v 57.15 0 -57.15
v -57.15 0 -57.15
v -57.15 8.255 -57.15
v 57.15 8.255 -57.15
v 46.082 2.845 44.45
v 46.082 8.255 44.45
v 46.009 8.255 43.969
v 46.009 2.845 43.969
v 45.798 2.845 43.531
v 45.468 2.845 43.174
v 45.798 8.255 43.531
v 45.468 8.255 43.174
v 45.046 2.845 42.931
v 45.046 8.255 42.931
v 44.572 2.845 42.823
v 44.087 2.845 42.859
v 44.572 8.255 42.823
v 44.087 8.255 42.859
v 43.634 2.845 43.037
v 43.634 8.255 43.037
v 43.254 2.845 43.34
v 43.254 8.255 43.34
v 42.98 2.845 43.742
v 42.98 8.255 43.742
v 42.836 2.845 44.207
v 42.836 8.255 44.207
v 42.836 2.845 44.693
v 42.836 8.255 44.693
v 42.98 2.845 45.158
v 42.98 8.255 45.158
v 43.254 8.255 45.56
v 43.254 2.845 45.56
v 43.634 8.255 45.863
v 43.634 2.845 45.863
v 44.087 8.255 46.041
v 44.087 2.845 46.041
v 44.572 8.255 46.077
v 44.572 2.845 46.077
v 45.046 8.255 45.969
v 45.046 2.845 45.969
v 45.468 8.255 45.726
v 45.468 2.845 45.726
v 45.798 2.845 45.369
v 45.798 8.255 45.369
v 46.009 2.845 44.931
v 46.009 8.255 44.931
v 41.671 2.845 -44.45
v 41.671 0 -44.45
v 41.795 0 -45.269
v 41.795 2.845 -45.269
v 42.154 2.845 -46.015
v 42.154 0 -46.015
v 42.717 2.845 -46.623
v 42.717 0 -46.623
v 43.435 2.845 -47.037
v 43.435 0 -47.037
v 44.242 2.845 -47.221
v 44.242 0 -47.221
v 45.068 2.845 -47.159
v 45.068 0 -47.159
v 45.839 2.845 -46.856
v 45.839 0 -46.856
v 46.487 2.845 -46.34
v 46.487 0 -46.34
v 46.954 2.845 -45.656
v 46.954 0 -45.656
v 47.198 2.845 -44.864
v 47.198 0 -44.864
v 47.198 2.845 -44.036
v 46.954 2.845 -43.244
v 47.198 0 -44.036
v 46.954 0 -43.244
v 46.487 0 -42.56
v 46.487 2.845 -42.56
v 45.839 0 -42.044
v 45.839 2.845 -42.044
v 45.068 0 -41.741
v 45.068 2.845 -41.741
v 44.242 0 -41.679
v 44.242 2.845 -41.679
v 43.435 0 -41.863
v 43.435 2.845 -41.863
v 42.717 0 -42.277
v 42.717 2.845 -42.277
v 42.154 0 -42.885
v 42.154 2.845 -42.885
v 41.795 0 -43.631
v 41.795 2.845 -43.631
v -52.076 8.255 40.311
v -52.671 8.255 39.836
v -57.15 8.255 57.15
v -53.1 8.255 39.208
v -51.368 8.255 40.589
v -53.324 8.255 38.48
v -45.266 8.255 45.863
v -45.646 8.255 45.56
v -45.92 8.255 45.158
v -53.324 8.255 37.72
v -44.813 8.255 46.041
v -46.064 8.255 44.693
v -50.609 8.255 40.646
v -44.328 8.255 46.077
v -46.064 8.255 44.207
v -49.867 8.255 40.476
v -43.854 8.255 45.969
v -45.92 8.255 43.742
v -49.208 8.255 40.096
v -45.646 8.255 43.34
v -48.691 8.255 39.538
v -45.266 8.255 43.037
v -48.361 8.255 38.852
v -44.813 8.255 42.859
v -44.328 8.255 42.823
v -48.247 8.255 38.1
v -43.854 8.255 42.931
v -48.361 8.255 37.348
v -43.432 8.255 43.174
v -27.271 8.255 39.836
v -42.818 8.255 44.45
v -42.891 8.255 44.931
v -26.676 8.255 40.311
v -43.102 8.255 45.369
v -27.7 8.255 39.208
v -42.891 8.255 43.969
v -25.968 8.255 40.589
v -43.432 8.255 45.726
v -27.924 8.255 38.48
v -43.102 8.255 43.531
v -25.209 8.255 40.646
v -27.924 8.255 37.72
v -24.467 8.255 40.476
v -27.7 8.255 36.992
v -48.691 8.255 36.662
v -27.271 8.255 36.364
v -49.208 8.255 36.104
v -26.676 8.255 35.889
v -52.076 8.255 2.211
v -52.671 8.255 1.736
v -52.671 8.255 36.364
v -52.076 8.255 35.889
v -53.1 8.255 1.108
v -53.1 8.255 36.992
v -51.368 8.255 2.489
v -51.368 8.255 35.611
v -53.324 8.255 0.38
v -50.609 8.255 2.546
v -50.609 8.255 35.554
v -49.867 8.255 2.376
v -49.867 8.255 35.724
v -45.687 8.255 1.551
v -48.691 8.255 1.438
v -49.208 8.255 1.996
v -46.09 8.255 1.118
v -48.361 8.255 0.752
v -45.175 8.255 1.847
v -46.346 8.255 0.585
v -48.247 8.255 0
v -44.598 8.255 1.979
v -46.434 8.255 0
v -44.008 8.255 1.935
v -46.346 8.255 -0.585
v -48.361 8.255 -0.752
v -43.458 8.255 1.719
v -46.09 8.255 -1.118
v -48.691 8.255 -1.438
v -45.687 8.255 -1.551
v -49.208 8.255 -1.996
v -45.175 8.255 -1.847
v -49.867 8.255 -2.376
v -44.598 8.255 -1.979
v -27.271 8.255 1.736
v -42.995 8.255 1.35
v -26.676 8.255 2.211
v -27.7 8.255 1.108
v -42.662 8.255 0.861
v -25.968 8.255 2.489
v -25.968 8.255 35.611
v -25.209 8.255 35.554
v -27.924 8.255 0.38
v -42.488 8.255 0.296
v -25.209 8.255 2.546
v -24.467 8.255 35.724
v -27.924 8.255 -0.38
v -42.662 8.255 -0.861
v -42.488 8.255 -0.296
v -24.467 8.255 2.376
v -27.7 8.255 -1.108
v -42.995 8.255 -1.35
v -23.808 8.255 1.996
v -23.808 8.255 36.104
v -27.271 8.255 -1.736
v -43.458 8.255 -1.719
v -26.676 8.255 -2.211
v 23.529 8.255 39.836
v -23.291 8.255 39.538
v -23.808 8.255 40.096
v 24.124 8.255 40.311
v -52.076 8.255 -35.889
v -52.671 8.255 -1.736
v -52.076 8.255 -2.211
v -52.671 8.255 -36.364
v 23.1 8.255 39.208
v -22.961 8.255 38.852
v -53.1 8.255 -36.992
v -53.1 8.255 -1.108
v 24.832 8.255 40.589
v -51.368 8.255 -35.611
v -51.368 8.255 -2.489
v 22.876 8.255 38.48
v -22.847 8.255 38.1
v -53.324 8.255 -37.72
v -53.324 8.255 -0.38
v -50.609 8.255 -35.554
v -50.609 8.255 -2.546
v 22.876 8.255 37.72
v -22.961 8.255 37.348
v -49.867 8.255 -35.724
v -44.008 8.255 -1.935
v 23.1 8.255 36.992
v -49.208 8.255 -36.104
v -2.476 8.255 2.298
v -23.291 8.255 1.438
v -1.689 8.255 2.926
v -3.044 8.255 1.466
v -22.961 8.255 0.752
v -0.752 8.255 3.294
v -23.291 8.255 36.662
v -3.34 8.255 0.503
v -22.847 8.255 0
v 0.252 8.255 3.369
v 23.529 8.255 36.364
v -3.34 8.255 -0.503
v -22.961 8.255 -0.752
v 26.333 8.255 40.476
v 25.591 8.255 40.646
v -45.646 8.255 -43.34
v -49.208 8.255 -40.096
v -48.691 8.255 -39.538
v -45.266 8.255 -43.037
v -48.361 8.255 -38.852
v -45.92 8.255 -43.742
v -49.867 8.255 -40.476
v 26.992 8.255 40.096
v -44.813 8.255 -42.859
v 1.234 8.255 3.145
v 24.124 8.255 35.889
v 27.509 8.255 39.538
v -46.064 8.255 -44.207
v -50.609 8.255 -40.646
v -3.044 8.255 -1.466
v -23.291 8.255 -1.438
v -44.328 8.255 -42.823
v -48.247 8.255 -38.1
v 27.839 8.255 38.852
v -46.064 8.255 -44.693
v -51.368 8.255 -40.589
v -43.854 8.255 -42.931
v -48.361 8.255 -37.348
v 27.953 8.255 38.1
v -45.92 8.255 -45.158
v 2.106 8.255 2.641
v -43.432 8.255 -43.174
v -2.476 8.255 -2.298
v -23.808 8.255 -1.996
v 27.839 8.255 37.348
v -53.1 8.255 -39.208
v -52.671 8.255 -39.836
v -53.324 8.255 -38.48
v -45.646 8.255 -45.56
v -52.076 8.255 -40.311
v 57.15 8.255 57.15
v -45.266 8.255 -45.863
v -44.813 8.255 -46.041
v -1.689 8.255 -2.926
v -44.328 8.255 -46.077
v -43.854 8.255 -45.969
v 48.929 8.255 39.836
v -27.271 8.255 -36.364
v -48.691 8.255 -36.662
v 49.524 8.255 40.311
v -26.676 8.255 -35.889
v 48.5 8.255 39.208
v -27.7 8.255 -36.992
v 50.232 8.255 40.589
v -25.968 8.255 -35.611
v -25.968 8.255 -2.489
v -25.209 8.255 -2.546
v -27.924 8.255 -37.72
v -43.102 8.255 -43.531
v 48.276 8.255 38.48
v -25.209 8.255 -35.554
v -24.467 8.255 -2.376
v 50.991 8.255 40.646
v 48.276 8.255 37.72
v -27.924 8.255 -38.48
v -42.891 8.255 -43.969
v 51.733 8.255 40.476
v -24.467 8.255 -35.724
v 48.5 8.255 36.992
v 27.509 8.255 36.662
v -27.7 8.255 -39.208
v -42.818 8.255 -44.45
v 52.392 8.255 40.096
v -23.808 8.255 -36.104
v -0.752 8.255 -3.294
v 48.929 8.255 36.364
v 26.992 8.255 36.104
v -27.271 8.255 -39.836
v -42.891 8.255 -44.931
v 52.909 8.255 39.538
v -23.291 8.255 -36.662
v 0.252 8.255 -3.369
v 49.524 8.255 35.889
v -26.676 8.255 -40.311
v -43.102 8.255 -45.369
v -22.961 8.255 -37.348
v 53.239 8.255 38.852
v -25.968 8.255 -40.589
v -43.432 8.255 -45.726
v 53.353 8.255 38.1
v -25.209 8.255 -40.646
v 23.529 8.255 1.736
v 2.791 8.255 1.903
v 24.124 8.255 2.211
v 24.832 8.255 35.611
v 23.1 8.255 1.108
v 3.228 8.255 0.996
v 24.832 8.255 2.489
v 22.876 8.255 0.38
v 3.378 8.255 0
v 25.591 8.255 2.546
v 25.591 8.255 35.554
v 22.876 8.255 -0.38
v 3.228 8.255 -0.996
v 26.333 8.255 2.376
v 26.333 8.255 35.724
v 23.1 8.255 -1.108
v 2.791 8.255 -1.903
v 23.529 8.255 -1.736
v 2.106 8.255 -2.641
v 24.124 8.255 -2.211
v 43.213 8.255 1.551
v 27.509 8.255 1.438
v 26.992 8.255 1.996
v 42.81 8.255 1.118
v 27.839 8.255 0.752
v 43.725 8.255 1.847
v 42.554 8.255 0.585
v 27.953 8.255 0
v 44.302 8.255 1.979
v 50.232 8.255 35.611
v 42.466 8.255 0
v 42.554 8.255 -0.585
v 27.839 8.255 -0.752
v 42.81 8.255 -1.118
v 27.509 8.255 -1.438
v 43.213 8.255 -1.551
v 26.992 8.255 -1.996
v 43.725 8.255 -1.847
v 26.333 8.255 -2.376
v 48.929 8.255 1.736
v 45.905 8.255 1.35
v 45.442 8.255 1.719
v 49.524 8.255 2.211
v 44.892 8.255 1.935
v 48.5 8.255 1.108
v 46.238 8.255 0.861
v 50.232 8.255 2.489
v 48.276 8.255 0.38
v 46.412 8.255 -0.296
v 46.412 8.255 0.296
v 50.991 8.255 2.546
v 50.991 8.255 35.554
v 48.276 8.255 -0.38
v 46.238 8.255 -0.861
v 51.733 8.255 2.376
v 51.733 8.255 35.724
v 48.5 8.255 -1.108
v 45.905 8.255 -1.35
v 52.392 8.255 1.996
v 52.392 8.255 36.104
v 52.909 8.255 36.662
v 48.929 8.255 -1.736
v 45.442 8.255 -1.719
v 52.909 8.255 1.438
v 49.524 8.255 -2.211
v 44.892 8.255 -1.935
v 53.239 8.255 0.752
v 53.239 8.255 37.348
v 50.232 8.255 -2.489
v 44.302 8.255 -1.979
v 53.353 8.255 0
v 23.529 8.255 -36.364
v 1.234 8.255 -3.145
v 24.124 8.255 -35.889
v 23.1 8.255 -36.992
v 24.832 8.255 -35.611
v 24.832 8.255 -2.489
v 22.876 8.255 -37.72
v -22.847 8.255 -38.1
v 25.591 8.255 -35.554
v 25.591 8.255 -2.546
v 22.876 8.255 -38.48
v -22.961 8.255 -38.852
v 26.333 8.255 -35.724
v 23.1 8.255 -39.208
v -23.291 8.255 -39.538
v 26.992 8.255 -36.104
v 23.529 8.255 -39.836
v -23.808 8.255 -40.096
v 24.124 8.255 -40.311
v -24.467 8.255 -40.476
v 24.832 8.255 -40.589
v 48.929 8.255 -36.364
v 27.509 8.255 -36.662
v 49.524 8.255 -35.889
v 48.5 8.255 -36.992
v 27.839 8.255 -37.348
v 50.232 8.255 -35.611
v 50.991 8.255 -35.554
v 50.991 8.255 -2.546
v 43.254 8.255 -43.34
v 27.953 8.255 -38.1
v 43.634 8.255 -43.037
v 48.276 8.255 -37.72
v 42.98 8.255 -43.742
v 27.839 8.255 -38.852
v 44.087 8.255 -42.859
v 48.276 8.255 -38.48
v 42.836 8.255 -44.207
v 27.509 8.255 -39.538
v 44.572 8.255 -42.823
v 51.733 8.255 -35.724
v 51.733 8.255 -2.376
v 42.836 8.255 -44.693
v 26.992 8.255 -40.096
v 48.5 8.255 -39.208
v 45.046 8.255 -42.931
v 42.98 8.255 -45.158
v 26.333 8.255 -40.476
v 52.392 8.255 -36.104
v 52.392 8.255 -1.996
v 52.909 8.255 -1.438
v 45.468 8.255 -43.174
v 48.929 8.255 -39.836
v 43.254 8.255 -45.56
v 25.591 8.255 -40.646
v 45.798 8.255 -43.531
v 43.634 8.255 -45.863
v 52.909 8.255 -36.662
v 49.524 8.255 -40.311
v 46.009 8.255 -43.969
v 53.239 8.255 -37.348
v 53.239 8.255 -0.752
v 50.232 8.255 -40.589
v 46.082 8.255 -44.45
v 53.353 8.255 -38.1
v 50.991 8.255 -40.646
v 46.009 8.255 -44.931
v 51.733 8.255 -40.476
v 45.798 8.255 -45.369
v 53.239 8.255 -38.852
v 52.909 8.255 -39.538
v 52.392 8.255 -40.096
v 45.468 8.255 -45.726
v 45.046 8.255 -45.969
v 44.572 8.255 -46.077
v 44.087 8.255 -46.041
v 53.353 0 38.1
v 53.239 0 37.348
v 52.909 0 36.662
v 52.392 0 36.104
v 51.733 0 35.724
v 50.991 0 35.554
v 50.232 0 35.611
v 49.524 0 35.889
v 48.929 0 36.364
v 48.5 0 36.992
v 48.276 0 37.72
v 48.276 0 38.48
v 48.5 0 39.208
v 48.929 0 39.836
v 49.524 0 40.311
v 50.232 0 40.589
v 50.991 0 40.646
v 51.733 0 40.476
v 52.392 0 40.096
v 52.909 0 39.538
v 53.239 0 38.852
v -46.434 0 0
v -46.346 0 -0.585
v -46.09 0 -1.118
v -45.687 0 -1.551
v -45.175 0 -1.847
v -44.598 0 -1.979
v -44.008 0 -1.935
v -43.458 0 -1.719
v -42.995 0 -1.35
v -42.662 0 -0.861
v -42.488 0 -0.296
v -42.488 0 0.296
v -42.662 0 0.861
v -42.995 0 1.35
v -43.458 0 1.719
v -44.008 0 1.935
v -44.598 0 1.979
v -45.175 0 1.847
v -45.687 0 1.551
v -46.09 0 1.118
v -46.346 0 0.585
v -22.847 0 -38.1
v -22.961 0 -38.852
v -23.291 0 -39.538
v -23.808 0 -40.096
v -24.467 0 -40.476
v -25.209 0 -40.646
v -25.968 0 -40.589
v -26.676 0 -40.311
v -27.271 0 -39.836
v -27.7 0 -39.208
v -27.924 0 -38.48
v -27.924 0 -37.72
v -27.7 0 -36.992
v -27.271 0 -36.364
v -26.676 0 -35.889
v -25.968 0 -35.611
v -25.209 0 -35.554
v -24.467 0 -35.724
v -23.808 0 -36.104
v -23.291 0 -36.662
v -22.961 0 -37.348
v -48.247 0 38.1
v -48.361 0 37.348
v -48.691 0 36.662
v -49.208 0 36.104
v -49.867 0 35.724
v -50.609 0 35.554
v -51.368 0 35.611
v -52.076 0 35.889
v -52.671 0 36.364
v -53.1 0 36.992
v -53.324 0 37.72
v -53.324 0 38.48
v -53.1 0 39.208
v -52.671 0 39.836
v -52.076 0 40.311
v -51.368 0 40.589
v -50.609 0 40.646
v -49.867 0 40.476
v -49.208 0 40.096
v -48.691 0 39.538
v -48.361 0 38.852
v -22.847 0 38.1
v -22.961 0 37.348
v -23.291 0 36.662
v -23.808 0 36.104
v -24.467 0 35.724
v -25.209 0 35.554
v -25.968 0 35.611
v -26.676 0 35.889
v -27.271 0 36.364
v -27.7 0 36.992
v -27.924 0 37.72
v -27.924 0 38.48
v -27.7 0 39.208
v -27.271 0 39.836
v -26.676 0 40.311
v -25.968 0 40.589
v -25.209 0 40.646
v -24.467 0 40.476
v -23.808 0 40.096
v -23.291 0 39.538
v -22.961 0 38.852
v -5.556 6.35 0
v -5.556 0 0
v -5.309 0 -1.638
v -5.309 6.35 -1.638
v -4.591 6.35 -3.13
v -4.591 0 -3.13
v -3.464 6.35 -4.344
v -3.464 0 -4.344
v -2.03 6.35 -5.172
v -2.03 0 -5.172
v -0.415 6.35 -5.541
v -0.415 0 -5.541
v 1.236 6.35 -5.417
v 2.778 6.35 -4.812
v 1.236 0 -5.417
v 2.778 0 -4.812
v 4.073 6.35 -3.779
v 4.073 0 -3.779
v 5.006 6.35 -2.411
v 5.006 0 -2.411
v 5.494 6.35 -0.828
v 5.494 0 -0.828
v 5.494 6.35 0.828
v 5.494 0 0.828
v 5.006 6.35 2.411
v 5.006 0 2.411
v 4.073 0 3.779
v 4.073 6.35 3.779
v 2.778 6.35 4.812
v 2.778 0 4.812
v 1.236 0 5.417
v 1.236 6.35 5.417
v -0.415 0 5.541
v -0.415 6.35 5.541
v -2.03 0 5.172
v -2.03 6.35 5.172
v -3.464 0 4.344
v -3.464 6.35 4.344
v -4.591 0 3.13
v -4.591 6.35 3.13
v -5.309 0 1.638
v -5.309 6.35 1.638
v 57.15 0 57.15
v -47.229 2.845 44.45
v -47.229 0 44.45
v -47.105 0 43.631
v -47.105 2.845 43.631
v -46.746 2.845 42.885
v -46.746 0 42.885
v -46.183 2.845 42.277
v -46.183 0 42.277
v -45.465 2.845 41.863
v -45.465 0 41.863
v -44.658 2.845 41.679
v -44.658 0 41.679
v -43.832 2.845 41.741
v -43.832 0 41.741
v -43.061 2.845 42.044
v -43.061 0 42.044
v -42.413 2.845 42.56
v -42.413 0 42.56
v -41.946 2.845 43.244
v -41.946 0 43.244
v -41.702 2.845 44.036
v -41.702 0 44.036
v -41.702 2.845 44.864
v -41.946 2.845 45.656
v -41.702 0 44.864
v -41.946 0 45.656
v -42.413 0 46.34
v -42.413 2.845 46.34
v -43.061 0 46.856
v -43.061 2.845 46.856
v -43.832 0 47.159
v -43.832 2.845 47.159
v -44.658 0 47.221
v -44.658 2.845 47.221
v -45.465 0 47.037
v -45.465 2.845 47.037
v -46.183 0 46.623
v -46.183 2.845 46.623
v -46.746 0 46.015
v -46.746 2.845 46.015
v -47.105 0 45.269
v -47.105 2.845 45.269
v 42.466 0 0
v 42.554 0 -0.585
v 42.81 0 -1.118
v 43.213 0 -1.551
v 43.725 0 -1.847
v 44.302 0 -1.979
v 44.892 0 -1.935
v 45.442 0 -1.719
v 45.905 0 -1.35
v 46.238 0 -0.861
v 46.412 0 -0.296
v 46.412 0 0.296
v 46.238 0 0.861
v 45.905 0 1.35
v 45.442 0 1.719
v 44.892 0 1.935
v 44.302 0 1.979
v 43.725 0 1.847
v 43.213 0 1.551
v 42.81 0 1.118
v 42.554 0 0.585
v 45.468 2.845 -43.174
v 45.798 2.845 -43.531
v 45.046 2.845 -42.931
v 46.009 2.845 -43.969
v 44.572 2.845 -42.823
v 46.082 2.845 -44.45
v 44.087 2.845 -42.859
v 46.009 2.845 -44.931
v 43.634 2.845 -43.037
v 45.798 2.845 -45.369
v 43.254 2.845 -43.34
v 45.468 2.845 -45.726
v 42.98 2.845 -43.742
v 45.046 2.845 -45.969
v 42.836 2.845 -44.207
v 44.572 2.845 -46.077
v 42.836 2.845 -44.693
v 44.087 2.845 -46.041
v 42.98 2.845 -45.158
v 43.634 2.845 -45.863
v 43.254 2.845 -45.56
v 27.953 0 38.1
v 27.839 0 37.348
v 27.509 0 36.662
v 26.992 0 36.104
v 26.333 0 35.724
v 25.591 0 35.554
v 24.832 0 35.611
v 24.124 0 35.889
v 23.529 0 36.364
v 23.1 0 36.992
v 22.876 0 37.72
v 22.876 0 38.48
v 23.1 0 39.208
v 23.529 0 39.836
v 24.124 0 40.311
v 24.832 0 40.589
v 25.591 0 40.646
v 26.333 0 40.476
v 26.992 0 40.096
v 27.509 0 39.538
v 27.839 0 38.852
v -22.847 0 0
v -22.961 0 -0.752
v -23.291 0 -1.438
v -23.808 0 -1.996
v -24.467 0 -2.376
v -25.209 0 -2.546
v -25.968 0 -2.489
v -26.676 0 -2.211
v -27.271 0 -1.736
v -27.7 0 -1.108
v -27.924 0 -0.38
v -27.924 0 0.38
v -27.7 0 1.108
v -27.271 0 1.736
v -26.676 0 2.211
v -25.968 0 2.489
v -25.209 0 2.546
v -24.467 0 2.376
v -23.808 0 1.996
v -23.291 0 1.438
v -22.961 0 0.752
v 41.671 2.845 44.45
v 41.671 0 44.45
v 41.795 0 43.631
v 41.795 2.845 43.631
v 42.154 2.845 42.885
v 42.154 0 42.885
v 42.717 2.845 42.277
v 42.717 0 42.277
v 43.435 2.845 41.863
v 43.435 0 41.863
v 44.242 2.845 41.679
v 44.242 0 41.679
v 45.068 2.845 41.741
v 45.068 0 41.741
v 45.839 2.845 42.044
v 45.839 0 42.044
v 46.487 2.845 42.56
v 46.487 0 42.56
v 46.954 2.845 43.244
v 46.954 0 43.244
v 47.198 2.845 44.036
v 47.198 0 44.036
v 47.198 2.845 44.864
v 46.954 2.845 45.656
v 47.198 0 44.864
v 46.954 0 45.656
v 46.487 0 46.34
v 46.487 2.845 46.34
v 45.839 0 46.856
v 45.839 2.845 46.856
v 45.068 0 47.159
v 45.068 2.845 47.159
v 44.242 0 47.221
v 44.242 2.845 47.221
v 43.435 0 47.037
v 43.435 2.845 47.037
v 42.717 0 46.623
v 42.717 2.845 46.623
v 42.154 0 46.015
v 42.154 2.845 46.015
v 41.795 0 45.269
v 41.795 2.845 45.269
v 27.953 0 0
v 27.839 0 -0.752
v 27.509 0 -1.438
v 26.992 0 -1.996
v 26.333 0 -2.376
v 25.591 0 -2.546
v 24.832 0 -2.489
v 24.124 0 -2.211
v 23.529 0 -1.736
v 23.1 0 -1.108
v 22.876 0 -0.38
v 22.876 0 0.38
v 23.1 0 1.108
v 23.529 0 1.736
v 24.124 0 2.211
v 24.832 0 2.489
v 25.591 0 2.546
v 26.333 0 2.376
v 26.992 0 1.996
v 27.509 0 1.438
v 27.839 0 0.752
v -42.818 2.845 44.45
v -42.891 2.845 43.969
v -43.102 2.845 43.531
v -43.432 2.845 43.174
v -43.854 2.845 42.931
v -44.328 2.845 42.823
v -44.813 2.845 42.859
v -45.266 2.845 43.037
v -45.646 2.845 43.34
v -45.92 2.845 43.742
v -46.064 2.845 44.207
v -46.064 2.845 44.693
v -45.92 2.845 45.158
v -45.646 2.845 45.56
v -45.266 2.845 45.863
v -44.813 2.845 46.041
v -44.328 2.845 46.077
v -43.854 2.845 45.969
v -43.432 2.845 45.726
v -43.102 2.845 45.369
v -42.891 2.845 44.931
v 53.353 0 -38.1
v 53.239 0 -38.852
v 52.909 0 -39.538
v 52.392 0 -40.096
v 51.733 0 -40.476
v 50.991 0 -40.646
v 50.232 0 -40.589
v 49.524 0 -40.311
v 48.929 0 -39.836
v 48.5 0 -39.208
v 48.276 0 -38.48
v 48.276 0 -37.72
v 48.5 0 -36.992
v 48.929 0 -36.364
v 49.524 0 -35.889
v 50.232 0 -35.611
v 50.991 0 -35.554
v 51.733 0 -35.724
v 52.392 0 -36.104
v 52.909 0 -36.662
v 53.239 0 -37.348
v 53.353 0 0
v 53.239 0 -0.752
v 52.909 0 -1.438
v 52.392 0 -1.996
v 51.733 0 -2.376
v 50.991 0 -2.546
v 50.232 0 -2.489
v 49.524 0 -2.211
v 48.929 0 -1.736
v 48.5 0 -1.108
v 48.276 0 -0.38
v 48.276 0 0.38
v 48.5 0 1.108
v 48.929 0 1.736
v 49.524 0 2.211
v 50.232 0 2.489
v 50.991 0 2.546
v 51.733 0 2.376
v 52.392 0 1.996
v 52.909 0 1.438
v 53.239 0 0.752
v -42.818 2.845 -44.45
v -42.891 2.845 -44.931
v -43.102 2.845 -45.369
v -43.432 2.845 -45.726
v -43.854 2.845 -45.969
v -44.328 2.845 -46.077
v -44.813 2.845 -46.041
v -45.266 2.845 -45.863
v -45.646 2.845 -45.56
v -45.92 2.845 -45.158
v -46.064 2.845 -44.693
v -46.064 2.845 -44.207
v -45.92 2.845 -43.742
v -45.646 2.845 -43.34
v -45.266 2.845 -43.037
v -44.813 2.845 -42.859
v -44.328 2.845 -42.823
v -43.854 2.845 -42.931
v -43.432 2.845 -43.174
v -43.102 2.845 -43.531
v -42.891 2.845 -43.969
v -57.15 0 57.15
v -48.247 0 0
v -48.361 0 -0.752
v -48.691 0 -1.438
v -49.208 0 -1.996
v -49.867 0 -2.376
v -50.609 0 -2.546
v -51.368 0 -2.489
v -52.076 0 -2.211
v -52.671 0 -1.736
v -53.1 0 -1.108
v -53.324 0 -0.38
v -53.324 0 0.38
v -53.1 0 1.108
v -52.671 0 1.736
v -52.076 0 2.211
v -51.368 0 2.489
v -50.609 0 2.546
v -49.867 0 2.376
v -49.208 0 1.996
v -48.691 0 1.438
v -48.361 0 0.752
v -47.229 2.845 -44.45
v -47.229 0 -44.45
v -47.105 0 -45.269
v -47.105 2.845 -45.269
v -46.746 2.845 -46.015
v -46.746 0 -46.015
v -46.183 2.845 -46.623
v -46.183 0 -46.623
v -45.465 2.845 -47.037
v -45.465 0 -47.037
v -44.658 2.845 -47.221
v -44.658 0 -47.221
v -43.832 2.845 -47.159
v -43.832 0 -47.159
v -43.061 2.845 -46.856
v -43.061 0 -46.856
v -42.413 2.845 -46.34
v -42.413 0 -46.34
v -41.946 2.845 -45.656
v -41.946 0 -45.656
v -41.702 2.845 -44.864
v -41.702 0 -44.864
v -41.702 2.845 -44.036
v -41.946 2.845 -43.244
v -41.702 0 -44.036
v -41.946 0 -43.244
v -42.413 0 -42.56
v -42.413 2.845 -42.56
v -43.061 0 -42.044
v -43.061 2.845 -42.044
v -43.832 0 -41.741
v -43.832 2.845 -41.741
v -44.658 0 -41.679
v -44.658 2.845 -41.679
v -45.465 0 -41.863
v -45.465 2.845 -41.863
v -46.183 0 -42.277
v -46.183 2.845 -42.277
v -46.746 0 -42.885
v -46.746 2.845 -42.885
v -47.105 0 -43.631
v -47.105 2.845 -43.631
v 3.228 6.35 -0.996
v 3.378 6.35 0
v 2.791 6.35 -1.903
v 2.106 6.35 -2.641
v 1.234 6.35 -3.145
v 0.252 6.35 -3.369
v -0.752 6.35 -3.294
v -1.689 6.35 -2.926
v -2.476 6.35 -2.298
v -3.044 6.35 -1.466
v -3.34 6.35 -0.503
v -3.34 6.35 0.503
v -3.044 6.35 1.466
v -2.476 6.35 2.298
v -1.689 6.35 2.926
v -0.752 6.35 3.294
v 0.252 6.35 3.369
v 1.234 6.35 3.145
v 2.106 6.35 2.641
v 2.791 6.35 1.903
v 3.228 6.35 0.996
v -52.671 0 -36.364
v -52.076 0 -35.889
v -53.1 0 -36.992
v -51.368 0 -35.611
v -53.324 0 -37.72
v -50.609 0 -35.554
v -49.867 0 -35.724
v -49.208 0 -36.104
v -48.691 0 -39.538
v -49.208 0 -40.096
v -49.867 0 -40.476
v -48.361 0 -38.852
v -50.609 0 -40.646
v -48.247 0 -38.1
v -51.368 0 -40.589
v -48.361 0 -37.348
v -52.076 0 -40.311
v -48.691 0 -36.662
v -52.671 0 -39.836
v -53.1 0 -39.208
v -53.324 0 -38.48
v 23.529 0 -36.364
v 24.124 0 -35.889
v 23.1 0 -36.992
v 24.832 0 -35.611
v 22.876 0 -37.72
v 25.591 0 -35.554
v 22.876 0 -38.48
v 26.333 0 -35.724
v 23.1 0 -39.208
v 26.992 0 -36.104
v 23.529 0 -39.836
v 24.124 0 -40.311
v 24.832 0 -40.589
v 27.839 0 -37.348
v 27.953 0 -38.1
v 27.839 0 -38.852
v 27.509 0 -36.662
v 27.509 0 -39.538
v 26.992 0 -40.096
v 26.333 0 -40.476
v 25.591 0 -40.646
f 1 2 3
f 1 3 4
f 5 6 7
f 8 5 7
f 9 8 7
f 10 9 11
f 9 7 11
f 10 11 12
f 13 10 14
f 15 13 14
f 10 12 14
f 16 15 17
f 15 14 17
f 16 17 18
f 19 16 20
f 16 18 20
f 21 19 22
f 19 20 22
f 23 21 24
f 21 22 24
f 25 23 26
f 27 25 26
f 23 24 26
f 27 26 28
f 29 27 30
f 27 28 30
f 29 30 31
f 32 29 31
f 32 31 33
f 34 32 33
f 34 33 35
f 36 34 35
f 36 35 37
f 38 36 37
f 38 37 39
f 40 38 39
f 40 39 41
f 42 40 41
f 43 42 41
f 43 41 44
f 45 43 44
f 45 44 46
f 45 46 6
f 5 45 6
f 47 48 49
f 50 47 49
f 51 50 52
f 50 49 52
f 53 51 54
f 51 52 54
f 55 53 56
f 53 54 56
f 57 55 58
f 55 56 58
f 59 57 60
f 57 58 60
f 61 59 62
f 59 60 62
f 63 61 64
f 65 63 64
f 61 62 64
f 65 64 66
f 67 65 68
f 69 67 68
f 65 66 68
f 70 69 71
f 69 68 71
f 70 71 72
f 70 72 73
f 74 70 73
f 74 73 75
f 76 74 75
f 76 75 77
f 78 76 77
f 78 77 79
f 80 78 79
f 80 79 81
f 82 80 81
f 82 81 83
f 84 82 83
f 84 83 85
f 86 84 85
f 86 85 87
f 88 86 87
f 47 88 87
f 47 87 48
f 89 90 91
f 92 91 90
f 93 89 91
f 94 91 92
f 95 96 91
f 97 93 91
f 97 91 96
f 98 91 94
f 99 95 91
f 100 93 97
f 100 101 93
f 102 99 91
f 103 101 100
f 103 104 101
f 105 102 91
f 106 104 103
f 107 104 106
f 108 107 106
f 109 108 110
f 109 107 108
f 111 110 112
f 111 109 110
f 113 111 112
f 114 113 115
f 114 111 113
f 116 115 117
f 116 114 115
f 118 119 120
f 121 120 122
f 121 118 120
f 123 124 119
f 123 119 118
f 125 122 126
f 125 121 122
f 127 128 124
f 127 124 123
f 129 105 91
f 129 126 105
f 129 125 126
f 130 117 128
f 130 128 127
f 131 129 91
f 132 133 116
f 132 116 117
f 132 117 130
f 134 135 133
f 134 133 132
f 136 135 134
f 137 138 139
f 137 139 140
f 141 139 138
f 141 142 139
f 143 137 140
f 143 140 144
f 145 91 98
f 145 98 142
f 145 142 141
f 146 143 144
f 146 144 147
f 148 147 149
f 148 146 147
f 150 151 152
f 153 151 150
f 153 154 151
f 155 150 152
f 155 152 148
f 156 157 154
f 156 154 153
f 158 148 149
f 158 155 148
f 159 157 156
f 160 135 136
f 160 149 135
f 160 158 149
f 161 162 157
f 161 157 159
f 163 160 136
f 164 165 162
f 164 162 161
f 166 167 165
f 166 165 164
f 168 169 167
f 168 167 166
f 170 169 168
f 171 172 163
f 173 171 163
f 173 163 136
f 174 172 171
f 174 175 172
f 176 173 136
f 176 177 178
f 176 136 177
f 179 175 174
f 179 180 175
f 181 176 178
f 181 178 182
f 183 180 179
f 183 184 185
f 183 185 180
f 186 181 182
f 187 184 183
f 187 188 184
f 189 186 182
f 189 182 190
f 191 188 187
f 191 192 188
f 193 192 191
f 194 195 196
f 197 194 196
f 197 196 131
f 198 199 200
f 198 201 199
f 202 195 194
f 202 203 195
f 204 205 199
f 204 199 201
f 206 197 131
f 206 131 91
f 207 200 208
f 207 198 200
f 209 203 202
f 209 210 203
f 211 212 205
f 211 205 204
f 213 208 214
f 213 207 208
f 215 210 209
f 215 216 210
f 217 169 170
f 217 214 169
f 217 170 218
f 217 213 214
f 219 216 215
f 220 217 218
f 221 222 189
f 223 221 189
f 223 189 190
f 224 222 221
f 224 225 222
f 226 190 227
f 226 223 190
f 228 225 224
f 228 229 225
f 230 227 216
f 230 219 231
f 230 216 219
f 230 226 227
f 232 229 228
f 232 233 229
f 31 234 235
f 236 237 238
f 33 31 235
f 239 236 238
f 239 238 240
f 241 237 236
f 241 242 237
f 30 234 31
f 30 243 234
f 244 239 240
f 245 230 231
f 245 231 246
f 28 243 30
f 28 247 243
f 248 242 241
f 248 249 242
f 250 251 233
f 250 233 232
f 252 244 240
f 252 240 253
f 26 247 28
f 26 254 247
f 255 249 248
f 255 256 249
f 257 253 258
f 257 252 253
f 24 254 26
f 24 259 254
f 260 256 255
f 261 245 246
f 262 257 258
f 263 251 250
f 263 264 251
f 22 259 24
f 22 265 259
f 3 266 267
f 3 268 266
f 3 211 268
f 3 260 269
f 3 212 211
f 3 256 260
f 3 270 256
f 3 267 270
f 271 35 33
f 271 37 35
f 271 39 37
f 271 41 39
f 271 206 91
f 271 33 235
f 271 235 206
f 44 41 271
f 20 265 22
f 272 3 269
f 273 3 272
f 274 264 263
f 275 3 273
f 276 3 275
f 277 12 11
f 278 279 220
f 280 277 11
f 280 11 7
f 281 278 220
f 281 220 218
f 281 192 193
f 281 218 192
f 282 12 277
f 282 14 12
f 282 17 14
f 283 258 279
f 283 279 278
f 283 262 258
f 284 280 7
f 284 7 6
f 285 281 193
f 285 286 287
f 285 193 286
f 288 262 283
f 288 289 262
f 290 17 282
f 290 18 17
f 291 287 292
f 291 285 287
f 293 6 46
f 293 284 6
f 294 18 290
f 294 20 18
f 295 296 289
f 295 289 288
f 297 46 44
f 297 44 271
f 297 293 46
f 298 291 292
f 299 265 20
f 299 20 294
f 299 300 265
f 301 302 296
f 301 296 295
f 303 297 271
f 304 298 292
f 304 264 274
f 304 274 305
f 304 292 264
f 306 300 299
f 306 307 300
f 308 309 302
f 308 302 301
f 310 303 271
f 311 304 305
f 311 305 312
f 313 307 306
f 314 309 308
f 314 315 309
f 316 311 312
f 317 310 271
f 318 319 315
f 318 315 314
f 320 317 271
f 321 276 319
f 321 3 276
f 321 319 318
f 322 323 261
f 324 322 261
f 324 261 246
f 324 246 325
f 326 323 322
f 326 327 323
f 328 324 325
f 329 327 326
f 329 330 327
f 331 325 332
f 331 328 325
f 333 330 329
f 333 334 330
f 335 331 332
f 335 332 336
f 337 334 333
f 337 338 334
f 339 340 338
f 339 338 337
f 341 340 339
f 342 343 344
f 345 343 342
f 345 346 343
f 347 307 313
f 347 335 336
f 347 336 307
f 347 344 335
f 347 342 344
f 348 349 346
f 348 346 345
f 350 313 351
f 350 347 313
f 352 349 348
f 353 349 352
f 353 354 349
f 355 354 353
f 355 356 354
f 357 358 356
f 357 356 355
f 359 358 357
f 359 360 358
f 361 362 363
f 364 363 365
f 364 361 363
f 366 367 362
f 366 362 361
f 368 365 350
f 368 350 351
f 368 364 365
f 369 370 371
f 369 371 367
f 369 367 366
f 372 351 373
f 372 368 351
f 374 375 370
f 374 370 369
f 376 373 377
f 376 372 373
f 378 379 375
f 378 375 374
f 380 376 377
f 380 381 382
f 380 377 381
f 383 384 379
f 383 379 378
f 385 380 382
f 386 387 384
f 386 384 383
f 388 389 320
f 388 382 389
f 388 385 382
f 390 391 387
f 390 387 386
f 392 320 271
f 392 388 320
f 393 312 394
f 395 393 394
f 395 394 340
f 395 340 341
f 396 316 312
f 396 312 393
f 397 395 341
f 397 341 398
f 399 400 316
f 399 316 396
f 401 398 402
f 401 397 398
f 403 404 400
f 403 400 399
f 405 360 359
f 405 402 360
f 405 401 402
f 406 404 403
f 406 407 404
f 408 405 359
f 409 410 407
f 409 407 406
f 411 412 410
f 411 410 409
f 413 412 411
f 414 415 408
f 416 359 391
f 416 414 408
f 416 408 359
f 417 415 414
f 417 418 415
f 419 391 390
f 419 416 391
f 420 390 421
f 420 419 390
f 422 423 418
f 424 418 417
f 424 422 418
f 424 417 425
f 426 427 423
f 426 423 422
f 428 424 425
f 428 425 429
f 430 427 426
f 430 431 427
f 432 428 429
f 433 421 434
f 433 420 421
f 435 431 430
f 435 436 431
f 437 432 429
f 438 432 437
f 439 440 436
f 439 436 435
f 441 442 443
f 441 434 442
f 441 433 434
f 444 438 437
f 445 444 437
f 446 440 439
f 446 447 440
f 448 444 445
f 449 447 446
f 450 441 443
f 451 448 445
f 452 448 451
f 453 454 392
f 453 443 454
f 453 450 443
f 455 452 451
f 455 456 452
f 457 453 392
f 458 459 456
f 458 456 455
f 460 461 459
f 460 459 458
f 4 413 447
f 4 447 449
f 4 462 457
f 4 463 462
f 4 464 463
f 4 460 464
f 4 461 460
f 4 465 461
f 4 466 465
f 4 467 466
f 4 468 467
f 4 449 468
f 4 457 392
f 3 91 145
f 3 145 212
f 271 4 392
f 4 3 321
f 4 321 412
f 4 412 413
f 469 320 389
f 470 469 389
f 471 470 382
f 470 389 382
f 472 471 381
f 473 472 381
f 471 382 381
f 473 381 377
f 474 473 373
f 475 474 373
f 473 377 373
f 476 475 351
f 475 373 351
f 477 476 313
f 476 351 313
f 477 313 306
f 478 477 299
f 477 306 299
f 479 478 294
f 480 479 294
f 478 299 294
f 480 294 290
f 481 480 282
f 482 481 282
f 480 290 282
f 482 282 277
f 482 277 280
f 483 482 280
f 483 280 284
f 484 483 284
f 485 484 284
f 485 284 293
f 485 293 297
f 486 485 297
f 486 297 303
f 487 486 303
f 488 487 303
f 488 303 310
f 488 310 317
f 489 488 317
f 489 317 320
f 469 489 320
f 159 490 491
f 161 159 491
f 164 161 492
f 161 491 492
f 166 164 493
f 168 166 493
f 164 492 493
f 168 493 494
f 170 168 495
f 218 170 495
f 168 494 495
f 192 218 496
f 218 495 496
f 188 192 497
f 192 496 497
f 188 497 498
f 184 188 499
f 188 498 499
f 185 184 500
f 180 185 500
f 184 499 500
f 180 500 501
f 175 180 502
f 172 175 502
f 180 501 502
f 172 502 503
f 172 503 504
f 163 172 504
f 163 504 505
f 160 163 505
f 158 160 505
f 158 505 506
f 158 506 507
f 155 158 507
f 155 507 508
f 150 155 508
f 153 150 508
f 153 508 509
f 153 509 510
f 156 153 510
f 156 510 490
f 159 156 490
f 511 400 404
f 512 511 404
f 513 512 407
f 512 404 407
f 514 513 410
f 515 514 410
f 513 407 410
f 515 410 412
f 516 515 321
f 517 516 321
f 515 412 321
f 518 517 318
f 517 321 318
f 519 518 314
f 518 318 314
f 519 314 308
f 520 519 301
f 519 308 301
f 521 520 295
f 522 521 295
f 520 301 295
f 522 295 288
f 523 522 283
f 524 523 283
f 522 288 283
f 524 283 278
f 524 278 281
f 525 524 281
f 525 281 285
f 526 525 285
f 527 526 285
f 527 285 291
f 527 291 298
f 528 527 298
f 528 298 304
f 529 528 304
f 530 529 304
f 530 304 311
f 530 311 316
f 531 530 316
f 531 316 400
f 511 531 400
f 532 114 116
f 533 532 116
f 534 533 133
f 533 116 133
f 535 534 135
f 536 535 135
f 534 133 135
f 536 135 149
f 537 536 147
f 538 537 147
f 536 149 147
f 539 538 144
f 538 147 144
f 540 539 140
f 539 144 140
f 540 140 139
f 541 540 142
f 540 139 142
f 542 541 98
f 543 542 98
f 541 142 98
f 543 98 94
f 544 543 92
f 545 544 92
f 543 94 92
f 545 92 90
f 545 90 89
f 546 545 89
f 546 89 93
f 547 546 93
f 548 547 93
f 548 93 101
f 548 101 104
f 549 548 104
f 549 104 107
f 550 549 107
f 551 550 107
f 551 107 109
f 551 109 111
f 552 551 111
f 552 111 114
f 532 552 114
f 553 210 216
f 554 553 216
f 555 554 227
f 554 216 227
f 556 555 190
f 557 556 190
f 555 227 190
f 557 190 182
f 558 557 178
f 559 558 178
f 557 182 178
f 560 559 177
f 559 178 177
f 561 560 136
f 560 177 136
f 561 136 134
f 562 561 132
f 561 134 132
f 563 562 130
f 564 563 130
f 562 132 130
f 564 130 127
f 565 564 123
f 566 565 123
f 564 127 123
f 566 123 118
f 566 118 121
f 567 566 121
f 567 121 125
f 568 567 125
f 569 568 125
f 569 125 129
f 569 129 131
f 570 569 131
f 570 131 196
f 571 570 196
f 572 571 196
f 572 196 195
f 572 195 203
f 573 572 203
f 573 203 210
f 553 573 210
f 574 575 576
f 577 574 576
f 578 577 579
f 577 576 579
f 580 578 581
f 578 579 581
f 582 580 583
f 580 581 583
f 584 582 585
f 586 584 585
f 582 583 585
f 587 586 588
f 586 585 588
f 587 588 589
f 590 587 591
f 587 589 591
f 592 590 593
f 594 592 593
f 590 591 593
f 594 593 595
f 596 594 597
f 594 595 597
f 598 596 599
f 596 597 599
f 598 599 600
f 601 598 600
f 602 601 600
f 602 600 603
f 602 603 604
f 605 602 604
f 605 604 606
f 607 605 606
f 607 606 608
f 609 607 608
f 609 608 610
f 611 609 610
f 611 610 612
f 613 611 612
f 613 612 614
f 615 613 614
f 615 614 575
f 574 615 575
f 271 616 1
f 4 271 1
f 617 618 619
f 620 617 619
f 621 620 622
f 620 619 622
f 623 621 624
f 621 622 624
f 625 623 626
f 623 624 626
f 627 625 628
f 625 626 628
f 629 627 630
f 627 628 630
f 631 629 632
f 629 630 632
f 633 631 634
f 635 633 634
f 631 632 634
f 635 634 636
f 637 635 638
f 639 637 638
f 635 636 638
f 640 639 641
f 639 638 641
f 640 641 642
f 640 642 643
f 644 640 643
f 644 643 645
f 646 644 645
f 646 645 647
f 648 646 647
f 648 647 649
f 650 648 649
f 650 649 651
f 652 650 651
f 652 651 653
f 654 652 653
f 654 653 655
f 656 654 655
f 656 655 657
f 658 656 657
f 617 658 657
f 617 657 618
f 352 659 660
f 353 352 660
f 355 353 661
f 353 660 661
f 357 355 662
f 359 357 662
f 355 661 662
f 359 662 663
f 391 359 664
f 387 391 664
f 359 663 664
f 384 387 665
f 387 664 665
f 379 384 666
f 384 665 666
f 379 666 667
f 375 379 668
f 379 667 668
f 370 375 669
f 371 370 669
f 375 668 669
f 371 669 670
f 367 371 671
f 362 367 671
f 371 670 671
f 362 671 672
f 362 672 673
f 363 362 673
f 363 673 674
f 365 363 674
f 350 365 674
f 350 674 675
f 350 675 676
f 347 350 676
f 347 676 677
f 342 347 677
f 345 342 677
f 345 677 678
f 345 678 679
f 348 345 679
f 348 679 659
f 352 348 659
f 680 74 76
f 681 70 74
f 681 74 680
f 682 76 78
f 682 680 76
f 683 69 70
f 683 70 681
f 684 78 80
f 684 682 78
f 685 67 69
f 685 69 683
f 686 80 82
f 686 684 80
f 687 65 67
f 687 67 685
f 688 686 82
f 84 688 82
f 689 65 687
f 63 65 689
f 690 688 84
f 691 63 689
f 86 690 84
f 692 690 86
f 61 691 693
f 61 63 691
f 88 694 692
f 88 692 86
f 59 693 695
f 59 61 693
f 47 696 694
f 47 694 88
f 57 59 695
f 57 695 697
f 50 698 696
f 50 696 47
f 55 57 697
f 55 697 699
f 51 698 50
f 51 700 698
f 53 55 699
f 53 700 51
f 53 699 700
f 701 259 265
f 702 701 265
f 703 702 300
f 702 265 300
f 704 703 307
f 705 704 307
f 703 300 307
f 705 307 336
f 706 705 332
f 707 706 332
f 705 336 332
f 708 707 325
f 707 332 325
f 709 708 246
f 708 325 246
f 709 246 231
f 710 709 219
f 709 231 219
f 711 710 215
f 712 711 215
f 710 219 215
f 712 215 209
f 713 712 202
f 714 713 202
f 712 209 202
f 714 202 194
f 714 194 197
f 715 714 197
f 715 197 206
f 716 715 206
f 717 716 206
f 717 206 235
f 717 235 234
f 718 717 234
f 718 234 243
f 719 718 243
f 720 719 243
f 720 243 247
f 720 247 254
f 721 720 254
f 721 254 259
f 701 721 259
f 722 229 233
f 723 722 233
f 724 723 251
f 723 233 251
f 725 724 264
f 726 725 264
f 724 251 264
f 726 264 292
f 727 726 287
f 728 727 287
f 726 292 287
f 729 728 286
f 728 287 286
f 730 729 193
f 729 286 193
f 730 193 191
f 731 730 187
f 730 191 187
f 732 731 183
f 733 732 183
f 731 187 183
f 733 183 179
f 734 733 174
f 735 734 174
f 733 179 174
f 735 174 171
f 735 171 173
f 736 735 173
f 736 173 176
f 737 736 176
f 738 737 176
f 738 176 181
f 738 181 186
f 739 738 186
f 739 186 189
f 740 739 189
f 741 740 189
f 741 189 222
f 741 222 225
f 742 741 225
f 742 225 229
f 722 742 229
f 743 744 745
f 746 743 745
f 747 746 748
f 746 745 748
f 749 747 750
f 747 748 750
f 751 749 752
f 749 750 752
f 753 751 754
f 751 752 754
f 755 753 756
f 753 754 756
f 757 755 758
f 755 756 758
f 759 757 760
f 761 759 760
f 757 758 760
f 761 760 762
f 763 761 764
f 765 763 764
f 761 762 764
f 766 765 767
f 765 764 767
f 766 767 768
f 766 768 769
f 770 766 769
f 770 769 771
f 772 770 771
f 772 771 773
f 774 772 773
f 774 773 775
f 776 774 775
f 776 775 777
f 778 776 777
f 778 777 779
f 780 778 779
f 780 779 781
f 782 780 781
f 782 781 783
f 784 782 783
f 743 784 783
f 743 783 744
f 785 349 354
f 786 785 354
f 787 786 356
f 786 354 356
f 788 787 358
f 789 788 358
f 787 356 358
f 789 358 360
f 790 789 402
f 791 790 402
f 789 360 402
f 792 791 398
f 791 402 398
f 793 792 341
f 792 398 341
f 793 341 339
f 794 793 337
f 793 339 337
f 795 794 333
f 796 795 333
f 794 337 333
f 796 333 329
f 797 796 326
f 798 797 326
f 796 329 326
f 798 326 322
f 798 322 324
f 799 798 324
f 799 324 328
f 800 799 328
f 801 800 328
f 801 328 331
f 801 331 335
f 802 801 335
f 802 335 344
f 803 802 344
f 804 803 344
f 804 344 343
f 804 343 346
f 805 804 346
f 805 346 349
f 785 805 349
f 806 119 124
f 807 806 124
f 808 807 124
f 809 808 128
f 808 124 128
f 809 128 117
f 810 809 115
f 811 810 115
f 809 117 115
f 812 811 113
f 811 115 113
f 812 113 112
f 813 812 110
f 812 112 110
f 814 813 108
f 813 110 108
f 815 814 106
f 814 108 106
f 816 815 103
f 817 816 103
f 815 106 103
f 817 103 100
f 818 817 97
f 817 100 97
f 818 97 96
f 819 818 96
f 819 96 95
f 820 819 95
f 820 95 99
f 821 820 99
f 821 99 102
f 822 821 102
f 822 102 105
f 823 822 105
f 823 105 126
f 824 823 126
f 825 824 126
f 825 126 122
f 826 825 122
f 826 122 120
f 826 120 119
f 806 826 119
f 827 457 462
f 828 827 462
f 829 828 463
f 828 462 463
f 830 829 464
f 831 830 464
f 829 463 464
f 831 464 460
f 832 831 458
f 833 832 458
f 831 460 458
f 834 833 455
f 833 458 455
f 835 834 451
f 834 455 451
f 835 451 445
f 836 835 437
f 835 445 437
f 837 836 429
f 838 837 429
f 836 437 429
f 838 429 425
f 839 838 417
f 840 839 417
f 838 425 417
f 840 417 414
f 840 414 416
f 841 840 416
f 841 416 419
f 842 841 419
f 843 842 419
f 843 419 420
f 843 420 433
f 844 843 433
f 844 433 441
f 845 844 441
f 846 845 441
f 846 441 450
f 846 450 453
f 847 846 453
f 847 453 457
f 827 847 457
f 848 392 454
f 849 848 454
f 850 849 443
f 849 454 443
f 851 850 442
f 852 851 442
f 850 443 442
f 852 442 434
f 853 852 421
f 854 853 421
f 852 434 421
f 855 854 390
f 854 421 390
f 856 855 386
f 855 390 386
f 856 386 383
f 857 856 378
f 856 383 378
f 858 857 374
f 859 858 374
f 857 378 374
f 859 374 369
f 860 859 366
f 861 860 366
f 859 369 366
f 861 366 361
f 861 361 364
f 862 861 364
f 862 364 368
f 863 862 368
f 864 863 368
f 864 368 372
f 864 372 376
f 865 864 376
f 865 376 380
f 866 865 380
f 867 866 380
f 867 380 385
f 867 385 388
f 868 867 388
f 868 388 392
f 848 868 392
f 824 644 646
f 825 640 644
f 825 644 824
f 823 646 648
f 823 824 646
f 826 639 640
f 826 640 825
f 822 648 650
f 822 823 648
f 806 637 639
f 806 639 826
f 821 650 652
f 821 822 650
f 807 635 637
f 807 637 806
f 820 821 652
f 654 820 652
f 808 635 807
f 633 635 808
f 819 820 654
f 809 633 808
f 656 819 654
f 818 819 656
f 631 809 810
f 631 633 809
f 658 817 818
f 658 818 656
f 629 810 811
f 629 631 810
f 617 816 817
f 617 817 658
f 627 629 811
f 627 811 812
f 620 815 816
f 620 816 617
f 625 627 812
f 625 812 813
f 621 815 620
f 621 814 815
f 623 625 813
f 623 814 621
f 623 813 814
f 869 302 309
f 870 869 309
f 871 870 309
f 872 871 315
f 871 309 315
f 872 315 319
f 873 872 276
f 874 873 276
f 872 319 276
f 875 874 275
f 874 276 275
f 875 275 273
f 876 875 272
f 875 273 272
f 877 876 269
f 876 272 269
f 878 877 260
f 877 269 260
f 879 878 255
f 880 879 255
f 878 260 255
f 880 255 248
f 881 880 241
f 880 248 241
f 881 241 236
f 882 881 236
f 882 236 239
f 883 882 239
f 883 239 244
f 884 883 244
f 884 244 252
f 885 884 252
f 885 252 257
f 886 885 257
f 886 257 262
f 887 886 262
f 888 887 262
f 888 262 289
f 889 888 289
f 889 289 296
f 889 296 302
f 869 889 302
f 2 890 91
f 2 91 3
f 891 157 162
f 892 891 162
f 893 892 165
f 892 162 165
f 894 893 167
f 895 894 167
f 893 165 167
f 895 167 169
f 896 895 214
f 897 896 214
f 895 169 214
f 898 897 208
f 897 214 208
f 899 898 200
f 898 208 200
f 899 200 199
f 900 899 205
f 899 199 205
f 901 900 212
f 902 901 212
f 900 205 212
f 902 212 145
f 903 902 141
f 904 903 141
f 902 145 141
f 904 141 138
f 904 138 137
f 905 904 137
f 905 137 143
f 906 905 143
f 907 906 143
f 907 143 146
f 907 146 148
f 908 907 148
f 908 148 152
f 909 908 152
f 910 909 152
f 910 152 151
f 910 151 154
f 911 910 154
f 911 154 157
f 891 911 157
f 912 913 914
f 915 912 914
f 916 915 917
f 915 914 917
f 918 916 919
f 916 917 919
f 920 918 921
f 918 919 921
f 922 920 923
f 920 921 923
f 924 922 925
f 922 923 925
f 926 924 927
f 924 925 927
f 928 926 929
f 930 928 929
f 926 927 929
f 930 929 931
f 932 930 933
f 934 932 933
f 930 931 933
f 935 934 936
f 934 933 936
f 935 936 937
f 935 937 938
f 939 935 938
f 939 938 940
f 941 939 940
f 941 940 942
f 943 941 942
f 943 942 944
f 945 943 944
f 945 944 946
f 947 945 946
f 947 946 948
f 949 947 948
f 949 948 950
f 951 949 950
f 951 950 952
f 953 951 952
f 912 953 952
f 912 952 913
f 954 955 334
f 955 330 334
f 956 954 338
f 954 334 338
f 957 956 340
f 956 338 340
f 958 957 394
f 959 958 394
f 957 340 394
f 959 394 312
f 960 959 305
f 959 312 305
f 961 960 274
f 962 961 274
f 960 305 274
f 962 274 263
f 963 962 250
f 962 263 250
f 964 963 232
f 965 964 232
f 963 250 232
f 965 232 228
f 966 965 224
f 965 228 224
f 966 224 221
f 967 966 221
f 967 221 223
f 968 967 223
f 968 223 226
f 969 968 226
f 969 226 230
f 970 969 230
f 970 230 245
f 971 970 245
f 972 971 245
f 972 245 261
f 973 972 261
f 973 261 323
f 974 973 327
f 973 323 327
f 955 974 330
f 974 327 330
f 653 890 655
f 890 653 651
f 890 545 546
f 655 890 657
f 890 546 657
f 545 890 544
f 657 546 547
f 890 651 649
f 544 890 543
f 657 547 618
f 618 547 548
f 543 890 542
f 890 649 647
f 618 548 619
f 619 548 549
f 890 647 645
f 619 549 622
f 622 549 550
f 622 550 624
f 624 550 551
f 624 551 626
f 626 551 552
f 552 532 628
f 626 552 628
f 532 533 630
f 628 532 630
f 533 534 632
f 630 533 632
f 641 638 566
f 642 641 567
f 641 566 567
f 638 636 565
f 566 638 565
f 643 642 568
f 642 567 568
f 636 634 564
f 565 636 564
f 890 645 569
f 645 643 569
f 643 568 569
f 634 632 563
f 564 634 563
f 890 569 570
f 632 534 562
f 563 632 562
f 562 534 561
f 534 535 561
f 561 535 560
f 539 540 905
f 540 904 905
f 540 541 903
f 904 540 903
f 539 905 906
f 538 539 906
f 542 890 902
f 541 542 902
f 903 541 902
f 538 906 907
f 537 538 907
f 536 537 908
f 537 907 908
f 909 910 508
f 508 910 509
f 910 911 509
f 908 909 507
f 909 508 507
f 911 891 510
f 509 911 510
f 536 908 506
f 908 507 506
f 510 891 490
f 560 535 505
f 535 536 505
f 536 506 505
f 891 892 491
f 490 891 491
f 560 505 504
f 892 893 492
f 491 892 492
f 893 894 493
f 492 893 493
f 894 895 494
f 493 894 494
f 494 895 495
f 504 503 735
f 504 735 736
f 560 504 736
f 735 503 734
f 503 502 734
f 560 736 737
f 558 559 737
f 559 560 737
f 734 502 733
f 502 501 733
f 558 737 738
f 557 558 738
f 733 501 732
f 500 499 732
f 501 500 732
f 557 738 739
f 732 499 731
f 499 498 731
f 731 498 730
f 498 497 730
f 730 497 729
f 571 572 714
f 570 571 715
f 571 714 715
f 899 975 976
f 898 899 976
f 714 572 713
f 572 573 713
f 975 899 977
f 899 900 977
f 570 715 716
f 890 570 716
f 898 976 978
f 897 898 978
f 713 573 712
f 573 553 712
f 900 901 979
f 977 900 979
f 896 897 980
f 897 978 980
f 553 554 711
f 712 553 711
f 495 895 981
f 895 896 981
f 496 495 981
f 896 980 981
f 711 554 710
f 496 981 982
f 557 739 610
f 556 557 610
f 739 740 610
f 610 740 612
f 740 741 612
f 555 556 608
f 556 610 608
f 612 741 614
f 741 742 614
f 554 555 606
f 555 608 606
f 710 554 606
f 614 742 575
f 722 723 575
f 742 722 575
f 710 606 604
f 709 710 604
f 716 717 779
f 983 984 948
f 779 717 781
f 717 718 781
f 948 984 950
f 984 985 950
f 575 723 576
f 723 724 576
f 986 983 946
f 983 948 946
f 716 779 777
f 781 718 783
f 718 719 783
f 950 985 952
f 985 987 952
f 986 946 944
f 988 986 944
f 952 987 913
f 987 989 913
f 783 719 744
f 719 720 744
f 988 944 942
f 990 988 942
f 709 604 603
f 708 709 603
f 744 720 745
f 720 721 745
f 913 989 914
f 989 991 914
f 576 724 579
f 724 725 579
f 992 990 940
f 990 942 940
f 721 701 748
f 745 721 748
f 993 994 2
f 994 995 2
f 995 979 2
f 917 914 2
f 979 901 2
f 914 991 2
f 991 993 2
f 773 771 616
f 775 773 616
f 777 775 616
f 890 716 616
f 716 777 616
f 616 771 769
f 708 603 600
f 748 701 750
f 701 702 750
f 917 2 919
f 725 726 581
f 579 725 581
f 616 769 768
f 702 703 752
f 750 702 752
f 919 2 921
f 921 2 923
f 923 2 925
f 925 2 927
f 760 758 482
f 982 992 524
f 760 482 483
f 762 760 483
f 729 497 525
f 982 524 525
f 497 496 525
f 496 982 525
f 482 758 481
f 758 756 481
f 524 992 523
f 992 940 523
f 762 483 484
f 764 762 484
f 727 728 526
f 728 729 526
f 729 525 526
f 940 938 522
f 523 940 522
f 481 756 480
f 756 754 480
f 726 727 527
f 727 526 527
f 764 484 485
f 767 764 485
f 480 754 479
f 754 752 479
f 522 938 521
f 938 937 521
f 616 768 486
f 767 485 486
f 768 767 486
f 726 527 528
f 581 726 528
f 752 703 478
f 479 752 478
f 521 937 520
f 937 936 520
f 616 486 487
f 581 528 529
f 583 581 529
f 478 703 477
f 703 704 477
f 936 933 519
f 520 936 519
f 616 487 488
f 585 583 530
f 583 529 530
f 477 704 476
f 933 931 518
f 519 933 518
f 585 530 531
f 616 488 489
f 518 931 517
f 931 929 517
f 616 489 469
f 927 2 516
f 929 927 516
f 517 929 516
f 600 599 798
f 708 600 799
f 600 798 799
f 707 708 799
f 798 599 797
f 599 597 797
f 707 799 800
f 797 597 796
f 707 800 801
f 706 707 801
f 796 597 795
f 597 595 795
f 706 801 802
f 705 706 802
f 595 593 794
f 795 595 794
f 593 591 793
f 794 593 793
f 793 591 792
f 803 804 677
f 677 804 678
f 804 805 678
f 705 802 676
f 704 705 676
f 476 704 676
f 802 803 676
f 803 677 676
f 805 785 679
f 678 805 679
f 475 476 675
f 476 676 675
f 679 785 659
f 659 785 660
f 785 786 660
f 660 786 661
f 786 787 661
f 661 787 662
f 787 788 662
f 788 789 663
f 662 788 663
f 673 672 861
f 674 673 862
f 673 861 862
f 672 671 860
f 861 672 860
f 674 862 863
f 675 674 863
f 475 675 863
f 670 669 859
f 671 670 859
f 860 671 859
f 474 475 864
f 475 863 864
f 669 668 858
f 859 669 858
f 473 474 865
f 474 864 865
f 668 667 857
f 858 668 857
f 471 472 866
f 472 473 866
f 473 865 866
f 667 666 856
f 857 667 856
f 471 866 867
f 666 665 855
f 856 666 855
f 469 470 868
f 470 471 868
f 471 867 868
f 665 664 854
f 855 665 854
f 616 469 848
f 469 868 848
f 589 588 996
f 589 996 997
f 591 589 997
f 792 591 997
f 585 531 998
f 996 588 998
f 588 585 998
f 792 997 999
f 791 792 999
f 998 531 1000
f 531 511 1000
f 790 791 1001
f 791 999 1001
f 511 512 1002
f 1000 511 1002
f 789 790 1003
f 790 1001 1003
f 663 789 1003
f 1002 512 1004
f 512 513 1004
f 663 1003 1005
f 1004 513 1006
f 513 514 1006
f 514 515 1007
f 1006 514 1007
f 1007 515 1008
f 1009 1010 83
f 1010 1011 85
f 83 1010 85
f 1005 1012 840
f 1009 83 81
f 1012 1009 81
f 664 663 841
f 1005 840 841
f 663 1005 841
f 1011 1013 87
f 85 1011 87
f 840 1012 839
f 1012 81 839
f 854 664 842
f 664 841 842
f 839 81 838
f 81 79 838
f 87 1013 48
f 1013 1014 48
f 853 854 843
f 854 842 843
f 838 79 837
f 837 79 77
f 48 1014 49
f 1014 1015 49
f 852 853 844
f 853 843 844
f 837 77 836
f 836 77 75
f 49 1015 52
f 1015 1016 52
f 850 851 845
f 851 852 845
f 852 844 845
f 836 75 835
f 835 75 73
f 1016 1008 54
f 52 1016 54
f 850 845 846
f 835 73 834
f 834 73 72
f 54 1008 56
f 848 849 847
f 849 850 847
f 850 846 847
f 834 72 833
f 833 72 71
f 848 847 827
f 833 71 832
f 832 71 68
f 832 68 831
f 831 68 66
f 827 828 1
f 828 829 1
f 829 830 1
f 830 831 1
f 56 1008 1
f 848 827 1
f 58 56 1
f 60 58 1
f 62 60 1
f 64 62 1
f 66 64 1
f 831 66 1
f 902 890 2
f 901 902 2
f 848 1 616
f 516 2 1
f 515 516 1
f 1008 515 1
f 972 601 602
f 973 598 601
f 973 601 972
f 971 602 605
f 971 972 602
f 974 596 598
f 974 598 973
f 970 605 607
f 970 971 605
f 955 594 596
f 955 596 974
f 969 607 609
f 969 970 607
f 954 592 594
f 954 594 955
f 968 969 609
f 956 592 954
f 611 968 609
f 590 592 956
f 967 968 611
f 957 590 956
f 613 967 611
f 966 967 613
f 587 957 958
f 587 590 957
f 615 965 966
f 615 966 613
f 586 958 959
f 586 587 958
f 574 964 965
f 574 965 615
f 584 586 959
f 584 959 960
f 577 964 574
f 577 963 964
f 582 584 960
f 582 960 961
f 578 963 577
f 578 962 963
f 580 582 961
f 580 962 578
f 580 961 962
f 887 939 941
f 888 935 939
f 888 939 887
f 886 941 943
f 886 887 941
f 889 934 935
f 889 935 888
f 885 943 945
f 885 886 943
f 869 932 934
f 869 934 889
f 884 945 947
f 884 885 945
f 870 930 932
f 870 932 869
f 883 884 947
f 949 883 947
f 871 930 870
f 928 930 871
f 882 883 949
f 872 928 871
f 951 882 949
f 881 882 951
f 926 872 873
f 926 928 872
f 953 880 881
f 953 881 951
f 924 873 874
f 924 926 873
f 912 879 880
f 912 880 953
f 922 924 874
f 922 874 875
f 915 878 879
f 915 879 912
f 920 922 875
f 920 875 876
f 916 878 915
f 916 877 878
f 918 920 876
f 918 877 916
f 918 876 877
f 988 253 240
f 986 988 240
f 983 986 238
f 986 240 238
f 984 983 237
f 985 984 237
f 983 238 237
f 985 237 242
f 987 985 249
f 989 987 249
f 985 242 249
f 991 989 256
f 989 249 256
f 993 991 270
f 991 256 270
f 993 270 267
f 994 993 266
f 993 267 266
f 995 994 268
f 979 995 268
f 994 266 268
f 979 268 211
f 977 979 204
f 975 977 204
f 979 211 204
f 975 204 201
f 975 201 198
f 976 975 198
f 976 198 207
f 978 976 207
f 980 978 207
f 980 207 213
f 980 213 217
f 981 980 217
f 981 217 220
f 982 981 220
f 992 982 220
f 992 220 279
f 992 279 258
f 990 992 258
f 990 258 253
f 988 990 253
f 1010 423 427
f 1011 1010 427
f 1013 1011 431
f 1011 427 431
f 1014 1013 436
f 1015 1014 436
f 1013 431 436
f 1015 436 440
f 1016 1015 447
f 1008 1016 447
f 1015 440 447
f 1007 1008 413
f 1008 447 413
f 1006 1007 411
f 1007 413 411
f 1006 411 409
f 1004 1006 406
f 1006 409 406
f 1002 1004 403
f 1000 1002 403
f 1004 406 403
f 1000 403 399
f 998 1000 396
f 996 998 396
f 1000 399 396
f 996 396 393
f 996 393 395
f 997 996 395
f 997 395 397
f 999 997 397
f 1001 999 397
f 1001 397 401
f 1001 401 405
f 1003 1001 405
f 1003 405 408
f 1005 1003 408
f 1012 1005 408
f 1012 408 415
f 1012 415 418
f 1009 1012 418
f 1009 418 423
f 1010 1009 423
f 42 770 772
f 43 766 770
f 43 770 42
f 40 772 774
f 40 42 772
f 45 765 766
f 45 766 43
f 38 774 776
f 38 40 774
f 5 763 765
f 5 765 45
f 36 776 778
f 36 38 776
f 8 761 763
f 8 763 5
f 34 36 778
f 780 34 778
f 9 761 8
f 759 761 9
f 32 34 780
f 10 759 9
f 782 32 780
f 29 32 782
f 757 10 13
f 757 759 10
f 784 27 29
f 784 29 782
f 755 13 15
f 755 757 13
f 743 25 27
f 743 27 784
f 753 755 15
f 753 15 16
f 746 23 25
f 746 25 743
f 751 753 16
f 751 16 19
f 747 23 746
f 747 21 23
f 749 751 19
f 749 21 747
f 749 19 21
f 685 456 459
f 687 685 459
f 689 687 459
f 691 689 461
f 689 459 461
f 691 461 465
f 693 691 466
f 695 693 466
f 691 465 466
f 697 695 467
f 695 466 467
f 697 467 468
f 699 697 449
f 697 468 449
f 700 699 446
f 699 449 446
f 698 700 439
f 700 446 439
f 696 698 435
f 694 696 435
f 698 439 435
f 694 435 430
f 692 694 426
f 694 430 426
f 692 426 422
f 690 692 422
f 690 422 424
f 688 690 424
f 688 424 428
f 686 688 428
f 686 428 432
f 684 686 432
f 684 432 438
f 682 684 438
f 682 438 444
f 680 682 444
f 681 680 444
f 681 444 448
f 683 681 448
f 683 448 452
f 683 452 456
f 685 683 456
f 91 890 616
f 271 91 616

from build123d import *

# Parameters (mm, degrees)
SKETCH1_W                                        = 114.3
SKETCH1_H                                        = 114.3
STOCK_DEPTH                                      = 8.255
CBORE_FOR_1_4_SOCKET_HEAD_CAP_SCREW1_D           = 6.7564
CBORE_FOR_1_4_SOCKET_HEAD_CAP_SCREW1_CBORE_D     = 11.1125
CBORE_FOR_1_4_SOCKET_HEAD_CAP_SCREW1_CBORE_DEPTH = 6.35
F_5_32_0_15625_DIAMETER_HOLE1_D                  = 3.96875
CBORE_FOR_4_SOCKET_HEAD_CAP_SCREW1_D             = 3.2639
CBORE_FOR_4_SOCKET_HEAD_CAP_SCREW1_DEPTH         = 8.255
CBORE_FOR_4_SOCKET_HEAD_CAP_SCREW1_CBORE_D       = 5.55752
CBORE_FOR_4_SOCKET_HEAD_CAP_SCREW1_CBORE_DEPTH   = 2.8448
F_1_4_20_TAPPED_HOLE1_D                          = 5.1054


with BuildPart() as part:
    # Sketch1 → stock (new body)
    with BuildSketch(Plane(origin=(0, 0, 0), x_dir=(1, 0, 0), z_dir=(0, 1, 0))):
        Rectangle(SKETCH1_W, SKETCH1_H)
    extrude(amount=STOCK_DEPTH)

    # CBORE for 1/4 Socket Head Cap Screw1 (through all)
    with Locations(Plane(origin=(0, 0, 0), x_dir=(-1, 0, 0), z_dir=(0, -1, 0))):
        with Locations((0, 0)):
            CounterBoreHole(CBORE_FOR_1_4_SOCKET_HEAD_CAP_SCREW1_D / 2, CBORE_FOR_1_4_SOCKET_HEAD_CAP_SCREW1_CBORE_D / 2, CBORE_FOR_1_4_SOCKET_HEAD_CAP_SCREW1_CBORE_DEPTH)

    # 5/32 (0.15625) Diameter Hole1 (through all)
    with Locations(Plane(origin=(0, 8.255, 0), x_dir=(1, 0, 0), z_dir=(0, 1, 0))):
        with Locations((44.45, 0), (-44.45, 0)):
            Hole(F_5_32_0_15625_DIAMETER_HOLE1_D / 2)

    # CBORE for #4 Socket Head Cap Screw1
    with Locations(Plane(origin=(0, 0, 0), x_dir=(-1, 0, 0), z_dir=(0, -1, 0))):
        with Locations((44.45, -44.45), (44.45, 44.45), (-44.45, 44.45), (-44.45, -44.45), (0, 0)):
            CounterBoreHole(CBORE_FOR_4_SOCKET_HEAD_CAP_SCREW1_D / 2, CBORE_FOR_4_SOCKET_HEAD_CAP_SCREW1_CBORE_D / 2, CBORE_FOR_4_SOCKET_HEAD_CAP_SCREW1_CBORE_DEPTH, depth=CBORE_FOR_4_SOCKET_HEAD_CAP_SCREW1_DEPTH)

    # 1/4-20 Tapped Hole1 (through all)
    with Locations(Plane(origin=(0, 0, 0), x_dir=(-1, 0, 0), z_dir=(0, -1, 0))):
        with Locations((50.8, -38.1), (25.4, -38.1), (25.4, 0), (50.8, 0), (50.8, 38.1), (25.4, 38.1), (-25.4, 38.1), (-50.8, 38.1), (-50.8, 0), (-25.4, 0), (-25.4, -38.1), (-50.8, -38.1)):
            Hole(F_1_4_20_TAPPED_HOLE1_D / 2)


solid = part.part
